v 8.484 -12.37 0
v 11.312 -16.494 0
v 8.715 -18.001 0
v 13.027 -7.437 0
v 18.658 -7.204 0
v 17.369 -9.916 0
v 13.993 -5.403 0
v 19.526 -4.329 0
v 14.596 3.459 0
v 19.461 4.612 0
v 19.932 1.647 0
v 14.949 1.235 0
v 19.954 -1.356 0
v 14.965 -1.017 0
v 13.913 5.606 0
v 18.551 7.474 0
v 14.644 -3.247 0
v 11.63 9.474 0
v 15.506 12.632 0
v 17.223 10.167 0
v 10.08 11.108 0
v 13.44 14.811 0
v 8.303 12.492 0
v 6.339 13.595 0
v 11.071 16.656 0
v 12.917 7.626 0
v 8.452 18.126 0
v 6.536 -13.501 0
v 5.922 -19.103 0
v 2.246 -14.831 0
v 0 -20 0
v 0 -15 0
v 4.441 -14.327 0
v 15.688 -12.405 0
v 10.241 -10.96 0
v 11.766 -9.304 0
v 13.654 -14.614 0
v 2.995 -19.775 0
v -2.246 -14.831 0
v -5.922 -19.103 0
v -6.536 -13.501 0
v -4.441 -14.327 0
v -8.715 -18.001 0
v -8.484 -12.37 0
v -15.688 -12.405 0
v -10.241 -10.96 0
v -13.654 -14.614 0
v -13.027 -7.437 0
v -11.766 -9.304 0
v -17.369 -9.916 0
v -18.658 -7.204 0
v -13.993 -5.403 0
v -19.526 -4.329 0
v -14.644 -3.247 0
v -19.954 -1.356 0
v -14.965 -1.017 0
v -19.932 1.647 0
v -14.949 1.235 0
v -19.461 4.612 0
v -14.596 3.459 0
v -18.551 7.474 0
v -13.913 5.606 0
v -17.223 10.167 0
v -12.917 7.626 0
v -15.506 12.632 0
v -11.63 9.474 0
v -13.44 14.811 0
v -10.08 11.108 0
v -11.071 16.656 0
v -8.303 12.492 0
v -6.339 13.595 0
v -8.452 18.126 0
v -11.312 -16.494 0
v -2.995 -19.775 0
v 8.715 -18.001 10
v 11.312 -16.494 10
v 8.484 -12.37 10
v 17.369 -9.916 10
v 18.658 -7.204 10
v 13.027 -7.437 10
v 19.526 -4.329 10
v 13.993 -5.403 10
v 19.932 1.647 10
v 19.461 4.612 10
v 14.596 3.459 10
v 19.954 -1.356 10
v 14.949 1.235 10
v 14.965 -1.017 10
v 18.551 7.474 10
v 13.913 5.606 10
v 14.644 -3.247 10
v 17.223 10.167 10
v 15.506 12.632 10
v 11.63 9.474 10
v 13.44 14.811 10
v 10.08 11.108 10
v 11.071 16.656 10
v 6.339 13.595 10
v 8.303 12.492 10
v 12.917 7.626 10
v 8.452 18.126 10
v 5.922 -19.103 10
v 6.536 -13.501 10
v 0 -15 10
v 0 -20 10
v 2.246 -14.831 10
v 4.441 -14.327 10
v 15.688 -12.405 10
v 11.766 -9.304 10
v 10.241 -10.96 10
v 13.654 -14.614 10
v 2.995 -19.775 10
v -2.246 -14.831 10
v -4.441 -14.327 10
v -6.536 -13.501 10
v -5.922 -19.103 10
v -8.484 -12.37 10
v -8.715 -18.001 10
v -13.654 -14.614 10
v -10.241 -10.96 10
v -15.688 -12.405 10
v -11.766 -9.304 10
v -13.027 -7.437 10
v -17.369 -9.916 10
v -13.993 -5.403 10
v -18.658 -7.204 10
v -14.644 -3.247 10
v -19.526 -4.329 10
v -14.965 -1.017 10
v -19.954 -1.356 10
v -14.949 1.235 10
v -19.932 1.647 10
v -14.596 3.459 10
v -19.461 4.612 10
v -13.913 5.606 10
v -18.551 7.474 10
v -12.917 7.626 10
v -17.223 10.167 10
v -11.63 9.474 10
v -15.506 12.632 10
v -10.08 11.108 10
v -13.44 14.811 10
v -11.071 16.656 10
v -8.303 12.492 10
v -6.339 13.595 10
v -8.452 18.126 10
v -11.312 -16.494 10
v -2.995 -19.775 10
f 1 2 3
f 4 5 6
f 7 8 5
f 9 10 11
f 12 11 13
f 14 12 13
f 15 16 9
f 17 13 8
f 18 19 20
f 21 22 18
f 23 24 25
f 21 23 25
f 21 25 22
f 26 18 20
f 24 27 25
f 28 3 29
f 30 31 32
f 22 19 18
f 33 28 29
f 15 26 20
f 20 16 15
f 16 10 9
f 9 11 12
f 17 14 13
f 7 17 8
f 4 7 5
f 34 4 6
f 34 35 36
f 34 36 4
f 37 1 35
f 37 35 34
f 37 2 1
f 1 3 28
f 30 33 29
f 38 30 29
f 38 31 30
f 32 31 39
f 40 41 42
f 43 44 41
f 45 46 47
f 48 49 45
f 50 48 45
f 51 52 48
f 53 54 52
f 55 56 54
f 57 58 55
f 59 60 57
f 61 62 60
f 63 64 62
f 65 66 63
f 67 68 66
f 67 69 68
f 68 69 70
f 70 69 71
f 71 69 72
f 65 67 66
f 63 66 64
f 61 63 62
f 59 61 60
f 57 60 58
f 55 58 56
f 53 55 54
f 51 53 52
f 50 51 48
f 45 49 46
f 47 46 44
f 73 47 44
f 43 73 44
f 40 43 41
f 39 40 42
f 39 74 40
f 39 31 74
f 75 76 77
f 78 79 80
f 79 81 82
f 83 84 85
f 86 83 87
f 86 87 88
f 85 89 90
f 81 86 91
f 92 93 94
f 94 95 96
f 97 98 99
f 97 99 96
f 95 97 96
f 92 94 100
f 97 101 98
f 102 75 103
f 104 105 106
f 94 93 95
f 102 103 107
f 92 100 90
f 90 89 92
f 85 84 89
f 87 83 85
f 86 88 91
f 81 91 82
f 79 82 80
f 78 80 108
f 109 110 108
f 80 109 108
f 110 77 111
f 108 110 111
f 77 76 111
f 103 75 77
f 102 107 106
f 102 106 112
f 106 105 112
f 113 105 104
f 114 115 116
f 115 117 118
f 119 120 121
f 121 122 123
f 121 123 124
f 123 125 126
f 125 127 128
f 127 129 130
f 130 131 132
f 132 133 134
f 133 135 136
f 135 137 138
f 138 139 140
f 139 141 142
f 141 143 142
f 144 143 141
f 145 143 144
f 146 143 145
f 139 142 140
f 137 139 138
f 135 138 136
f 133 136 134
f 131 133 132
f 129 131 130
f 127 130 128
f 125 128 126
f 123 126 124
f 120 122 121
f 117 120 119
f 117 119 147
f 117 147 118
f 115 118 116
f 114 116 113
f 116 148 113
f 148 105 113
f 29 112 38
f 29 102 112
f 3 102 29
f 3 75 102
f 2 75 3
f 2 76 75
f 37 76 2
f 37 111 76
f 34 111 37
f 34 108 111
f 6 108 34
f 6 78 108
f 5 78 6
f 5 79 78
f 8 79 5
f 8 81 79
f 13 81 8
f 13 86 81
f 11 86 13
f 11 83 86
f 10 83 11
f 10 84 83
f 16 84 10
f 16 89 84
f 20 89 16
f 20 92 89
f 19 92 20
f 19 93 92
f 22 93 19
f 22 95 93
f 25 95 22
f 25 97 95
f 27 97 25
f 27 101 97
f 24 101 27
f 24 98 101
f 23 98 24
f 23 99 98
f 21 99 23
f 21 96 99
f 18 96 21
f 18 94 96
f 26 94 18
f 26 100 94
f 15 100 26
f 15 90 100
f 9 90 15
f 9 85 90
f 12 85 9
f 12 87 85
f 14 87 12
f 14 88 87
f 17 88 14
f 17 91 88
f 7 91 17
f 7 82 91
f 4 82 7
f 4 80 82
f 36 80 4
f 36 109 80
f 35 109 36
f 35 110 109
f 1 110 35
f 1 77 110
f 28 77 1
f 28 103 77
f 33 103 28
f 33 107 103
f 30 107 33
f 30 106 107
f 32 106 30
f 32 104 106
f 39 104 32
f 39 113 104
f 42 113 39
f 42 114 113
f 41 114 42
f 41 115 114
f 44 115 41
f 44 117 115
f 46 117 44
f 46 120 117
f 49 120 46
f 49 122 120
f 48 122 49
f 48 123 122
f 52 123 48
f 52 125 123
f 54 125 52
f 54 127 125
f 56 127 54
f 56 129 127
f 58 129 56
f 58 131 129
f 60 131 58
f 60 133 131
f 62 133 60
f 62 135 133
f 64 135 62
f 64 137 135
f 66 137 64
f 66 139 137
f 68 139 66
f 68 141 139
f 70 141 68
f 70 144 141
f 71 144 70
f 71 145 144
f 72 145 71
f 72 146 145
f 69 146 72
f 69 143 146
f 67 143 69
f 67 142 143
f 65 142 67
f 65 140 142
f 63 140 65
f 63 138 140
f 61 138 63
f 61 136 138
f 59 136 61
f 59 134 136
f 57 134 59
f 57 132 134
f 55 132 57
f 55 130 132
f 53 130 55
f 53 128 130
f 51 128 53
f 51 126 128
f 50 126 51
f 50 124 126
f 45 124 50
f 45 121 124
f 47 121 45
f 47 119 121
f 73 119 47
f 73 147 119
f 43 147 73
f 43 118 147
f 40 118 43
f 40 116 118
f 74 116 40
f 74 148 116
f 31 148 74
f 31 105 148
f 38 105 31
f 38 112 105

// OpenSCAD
$fn = 32;

// ----------------------------------------------------------------------
// Spring clip: 40 mm outside, 5 mm band, 50 degree opening
// ----------------------------------------------------------------------

// --- parameters (mm) ---
outer_r = 20;             // clip outside radius
inner_r = 15;             // clip bore radius
band = 5;                 // band thickness
clip_w = 10;              // clip width
opening = 50;             // opening angle

clip_profile = [[-8.452, 18.126], [-11.071, 16.656], [-13.44, 14.811], [-15.506, 12.632], [-17.223, 10.167], [-18.551, 7.474], [-19.461, 4.612], [-19.932, 1.647], [-19.954, -1.356], [-19.526, -4.329], [-18.658, -7.204], [-17.369, -9.916], [-15.688, -12.405], [-13.654, -14.614], [-11.312, -16.494], [-8.715, -18.001], [-5.922, -19.103], [-2.995, -19.775], [0, -20], [2.995, -19.775], [5.922, -19.103], [8.715, -18.001], [11.312, -16.494], [13.654, -14.614], [15.688, -12.405], [17.369, -9.916], [18.658, -7.204], [19.526, -4.329], [19.954, -1.356], [19.932, 1.647], [19.461, 4.612], [18.551, 7.474], [17.223, 10.167], [15.506, 12.632], [13.44, 14.811], [11.071, 16.656], [8.452, 18.126], [6.339, 13.595], [8.303, 12.492], [10.08, 11.108], [11.63, 9.474], [12.917, 7.626], [13.913, 5.606], [14.596, 3.459], [14.949, 1.235], [14.965, -1.017], [14.644, -3.247], [13.993, -5.403], [13.027, -7.437], [11.766, -9.304], [10.241, -10.96], [8.484, -12.37], [6.536, -13.501], [4.441, -14.327], [2.246, -14.831], [0, -15], [-2.246, -14.831], [-4.441, -14.327], [-6.536, -13.501], [-8.484, -12.37], [-10.241, -10.96], [-11.766, -9.304], [-13.027, -7.437], [-13.993, -5.403], [-14.644, -3.247], [-14.965, -1.017], [-14.949, 1.235], [-14.596, 3.459], [-13.913, 5.606], [-12.917, 7.626], [-11.63, 9.474], [-10.08, 11.108], [-8.303, 12.492], [-6.339, 13.595]];

difference() {
  union() {
    linear_extrude(height = clip_w) polygon(clip_profile);
  }
}
